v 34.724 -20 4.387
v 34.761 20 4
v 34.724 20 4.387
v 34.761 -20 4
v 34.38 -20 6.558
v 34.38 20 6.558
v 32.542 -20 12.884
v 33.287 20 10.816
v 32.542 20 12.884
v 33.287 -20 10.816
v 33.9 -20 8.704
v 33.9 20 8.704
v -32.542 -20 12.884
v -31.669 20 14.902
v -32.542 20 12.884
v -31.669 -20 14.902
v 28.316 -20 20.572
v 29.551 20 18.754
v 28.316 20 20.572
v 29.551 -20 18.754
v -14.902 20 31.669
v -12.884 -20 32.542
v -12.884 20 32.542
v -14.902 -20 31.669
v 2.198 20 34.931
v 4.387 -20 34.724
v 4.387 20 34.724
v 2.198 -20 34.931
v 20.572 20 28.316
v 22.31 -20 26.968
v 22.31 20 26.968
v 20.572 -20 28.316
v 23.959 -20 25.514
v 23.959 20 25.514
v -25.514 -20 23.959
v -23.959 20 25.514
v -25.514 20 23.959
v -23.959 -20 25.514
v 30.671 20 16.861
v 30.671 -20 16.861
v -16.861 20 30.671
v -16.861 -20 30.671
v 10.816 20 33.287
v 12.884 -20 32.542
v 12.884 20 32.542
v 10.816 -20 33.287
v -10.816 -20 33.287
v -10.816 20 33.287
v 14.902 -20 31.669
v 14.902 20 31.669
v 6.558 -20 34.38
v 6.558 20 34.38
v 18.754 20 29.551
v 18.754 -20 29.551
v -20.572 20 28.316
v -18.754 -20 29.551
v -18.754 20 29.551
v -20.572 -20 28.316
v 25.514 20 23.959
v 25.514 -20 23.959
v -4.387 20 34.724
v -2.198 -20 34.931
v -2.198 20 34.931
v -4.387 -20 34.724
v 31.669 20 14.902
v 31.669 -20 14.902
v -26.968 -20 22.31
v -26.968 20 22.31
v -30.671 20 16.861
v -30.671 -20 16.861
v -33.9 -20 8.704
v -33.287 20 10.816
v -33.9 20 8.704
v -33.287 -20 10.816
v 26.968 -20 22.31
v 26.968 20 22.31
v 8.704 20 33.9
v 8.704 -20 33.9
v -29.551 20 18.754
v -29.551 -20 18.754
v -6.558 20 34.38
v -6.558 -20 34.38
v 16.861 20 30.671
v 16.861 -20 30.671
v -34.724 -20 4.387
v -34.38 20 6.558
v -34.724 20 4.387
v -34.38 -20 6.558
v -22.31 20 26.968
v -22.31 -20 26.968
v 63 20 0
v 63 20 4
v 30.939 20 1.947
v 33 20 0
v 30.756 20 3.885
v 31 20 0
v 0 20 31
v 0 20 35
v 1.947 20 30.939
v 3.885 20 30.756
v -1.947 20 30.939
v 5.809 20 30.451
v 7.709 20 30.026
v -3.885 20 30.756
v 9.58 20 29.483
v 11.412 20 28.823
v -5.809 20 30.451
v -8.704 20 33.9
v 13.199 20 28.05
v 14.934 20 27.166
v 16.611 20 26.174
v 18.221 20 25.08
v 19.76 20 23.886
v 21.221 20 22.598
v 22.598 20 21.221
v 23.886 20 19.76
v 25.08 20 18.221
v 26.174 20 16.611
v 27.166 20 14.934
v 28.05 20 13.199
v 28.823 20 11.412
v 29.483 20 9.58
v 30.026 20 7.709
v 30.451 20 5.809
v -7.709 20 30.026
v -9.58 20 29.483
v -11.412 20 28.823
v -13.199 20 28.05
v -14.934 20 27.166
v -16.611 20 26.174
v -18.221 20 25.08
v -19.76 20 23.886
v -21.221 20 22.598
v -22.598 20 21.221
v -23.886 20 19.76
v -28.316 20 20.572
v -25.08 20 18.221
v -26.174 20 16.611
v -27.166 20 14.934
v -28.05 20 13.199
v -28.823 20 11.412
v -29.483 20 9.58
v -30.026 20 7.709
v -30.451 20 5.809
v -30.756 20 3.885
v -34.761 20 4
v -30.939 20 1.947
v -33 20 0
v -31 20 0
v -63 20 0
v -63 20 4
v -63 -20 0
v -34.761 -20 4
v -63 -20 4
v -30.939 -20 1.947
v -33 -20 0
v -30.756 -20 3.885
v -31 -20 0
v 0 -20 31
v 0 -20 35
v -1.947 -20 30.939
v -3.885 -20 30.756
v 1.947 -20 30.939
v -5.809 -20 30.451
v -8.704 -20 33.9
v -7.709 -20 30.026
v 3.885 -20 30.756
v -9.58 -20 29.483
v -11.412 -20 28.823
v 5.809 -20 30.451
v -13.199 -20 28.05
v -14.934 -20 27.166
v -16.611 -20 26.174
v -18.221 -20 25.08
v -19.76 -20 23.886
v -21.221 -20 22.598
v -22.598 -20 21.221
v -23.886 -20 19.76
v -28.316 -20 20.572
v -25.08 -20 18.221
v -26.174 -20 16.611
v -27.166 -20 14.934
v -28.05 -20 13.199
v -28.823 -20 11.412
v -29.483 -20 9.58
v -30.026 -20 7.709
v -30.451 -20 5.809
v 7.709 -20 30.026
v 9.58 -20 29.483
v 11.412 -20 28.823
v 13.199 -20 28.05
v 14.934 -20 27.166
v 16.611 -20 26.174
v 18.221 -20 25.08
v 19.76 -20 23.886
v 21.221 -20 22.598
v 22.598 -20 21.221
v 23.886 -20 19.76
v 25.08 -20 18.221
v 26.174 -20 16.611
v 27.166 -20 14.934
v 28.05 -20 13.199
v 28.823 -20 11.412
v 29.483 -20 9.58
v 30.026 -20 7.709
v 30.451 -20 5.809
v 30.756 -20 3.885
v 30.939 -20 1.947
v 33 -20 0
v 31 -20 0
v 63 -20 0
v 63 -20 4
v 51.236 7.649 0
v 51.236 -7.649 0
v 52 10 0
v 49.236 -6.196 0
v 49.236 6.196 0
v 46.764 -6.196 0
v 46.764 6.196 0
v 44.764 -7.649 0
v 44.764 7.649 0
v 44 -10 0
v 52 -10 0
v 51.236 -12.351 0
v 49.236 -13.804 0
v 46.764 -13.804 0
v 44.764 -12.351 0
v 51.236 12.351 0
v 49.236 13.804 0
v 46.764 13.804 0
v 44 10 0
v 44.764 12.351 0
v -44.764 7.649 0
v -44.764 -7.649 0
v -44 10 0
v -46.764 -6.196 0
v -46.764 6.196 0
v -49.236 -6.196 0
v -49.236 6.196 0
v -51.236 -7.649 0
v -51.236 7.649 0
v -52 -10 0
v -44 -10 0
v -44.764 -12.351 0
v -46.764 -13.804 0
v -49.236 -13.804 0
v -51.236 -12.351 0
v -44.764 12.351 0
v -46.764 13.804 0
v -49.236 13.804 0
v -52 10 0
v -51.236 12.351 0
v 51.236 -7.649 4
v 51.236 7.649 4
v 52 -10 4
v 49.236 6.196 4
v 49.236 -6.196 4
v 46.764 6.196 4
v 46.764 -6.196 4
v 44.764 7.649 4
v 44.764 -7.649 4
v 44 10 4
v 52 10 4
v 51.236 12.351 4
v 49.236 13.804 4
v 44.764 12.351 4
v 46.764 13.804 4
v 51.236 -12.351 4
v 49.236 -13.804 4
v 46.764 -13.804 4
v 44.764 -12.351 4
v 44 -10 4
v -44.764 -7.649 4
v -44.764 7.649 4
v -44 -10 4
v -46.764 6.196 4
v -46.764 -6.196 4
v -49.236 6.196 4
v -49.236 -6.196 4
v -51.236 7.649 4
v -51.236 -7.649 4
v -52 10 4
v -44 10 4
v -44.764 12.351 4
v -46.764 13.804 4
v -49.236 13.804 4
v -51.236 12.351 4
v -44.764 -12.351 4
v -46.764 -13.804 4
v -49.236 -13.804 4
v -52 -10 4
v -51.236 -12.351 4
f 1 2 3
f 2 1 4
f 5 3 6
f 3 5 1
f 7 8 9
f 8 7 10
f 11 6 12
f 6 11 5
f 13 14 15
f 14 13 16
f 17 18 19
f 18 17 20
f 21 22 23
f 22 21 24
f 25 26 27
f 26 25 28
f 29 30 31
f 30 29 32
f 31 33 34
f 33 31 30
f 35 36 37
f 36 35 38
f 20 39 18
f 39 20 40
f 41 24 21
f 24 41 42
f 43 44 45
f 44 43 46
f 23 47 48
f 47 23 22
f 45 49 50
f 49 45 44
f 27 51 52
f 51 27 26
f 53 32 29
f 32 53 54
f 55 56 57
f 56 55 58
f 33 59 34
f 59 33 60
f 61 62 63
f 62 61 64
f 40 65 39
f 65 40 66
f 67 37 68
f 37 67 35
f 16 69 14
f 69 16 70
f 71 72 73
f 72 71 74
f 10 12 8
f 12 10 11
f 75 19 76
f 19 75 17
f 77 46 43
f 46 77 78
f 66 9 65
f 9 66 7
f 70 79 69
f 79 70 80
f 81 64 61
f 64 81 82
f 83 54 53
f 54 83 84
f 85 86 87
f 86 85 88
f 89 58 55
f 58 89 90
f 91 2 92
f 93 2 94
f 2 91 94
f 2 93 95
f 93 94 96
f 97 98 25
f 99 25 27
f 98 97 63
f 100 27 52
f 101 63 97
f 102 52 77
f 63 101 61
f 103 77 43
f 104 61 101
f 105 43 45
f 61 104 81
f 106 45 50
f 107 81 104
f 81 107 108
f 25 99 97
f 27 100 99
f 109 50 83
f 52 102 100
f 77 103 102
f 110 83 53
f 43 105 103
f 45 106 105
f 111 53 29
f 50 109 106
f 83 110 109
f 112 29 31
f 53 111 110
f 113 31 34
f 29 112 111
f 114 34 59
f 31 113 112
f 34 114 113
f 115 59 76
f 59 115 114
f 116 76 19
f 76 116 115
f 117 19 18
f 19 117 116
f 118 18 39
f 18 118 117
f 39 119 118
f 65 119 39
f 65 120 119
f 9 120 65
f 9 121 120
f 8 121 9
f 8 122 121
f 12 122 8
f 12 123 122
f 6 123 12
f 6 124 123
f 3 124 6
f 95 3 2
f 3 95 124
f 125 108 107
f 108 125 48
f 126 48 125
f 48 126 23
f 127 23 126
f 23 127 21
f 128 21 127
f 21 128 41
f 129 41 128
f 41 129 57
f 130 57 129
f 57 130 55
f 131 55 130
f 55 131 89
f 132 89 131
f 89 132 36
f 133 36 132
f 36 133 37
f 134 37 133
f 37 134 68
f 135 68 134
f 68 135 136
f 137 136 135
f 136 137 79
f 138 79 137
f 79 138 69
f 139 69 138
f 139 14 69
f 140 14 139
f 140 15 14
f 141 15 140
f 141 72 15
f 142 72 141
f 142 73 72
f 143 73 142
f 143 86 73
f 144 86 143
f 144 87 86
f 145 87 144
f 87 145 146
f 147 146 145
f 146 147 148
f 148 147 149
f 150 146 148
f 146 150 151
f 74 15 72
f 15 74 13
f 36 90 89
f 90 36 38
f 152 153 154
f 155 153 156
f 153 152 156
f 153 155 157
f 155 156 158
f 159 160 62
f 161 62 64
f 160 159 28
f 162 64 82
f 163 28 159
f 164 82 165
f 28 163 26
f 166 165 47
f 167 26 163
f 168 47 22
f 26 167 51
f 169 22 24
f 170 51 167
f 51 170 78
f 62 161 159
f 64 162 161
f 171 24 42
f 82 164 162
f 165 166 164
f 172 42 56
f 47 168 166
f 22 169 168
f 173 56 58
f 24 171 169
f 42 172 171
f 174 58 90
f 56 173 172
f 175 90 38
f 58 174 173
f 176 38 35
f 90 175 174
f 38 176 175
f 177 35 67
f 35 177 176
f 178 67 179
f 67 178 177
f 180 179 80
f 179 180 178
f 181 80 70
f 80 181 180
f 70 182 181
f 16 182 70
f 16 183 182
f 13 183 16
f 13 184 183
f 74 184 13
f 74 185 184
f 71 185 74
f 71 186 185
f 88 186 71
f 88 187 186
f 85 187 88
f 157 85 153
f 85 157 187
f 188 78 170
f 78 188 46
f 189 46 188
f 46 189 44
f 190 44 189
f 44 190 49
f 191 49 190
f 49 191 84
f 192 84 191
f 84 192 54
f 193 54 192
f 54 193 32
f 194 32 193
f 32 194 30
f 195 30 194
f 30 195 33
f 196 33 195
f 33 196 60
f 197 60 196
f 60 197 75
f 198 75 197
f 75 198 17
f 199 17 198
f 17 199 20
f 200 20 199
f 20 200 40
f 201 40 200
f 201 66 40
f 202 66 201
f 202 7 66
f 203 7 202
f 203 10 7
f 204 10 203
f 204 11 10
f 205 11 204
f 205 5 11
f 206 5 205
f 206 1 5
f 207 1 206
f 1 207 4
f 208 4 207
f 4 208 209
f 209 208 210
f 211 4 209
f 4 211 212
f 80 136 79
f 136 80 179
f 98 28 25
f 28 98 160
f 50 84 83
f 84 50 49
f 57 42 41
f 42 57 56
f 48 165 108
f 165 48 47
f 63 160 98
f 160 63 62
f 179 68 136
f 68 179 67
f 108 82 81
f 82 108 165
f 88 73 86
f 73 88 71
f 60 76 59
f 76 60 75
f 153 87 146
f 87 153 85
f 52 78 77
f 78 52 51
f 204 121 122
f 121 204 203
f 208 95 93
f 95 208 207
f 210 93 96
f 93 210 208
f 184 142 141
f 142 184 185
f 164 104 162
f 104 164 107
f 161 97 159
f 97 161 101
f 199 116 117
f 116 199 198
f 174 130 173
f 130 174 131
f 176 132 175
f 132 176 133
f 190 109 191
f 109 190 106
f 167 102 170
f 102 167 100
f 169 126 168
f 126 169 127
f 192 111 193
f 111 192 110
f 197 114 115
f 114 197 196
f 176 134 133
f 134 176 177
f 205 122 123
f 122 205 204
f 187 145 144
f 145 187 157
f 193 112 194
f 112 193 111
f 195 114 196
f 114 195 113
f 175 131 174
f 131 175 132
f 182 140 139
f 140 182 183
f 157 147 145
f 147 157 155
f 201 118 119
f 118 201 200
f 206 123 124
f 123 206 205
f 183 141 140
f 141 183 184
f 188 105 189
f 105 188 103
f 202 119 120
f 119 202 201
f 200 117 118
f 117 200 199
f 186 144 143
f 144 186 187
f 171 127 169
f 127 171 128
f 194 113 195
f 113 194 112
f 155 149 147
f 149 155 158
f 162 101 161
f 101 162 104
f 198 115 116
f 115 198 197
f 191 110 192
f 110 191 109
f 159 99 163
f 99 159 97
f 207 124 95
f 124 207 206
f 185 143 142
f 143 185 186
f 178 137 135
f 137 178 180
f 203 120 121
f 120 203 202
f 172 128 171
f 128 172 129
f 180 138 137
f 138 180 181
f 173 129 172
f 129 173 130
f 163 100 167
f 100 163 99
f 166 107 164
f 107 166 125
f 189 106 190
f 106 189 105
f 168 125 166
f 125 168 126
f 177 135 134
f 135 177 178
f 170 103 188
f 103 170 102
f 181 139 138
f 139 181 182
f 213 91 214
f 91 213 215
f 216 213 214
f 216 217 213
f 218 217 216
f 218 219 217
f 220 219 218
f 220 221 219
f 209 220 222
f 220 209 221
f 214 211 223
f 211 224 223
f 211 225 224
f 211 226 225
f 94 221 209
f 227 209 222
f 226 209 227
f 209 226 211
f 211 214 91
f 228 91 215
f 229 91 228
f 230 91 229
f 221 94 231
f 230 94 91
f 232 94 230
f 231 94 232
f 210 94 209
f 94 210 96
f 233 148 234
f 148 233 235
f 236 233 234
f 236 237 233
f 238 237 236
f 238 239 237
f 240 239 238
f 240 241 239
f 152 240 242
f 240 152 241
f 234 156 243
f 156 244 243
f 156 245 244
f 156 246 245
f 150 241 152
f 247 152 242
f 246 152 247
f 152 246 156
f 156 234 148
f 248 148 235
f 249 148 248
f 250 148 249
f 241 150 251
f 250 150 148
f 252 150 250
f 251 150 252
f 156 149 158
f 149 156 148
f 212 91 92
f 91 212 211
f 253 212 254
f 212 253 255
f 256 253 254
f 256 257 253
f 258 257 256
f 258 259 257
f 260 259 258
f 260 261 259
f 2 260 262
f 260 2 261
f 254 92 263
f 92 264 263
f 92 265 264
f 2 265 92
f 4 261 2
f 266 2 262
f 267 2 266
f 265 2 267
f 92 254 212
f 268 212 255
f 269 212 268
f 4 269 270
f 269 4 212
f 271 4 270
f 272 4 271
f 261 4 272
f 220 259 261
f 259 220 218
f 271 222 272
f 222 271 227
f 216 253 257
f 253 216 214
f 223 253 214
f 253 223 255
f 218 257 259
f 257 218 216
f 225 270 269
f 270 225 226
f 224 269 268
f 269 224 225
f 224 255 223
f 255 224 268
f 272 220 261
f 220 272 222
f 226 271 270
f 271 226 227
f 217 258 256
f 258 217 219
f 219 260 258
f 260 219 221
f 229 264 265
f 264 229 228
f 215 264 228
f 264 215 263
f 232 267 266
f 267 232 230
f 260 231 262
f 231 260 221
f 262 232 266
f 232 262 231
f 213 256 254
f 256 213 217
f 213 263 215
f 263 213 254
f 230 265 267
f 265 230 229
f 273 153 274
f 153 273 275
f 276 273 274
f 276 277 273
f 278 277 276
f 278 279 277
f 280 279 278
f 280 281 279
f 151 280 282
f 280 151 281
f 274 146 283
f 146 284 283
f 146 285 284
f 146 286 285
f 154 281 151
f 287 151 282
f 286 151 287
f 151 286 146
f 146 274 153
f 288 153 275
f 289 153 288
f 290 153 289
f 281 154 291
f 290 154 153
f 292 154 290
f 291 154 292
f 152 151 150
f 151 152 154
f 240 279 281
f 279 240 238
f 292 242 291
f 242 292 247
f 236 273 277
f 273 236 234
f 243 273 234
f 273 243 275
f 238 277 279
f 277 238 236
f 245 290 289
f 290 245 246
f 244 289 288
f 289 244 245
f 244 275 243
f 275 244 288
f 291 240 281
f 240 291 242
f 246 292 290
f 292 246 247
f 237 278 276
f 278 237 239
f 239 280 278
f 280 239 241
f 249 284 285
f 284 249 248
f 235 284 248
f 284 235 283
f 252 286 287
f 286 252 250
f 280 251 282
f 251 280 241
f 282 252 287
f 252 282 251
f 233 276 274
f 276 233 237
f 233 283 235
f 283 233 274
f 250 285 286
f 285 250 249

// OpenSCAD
difference(){
    rotate([90,0,0]){
    difference(){
         cylinder(h=40, r1=35, r2=35, center=true,$fn=100);
         cylinder(h=40, r1=31, r2=31, center=true,$fn=100);
           
     }
   }

   translate([0,0,-30]){
            cube([70,70,60],center=true);
  }
}


translate([48,0,2]){
        difference(){
           cube([30,40,4],center=true); 
           translate([0,-10,0]){
              cylinder(h=10, r1=4, r2=4, center=true,$fn=10);  
           }
           translate([0,10,0]){
              cylinder(h=10, r1=4, r2=4, center=true,$fn=10);  
           }
           
        }
     
       
}
translate([-48,0,2]){
           difference(){
           cube([30,40,4],center=true); 
           translate([0,-10,0]){
              cylinder(h=10, r1=4, r2=4, center=true,$fn=10);  
           }
           translate([0,10,0]){
              cylinder(h=10, r1=4, r2=4, center=true,$fn=10);  
           }
           
        }            
}




 
